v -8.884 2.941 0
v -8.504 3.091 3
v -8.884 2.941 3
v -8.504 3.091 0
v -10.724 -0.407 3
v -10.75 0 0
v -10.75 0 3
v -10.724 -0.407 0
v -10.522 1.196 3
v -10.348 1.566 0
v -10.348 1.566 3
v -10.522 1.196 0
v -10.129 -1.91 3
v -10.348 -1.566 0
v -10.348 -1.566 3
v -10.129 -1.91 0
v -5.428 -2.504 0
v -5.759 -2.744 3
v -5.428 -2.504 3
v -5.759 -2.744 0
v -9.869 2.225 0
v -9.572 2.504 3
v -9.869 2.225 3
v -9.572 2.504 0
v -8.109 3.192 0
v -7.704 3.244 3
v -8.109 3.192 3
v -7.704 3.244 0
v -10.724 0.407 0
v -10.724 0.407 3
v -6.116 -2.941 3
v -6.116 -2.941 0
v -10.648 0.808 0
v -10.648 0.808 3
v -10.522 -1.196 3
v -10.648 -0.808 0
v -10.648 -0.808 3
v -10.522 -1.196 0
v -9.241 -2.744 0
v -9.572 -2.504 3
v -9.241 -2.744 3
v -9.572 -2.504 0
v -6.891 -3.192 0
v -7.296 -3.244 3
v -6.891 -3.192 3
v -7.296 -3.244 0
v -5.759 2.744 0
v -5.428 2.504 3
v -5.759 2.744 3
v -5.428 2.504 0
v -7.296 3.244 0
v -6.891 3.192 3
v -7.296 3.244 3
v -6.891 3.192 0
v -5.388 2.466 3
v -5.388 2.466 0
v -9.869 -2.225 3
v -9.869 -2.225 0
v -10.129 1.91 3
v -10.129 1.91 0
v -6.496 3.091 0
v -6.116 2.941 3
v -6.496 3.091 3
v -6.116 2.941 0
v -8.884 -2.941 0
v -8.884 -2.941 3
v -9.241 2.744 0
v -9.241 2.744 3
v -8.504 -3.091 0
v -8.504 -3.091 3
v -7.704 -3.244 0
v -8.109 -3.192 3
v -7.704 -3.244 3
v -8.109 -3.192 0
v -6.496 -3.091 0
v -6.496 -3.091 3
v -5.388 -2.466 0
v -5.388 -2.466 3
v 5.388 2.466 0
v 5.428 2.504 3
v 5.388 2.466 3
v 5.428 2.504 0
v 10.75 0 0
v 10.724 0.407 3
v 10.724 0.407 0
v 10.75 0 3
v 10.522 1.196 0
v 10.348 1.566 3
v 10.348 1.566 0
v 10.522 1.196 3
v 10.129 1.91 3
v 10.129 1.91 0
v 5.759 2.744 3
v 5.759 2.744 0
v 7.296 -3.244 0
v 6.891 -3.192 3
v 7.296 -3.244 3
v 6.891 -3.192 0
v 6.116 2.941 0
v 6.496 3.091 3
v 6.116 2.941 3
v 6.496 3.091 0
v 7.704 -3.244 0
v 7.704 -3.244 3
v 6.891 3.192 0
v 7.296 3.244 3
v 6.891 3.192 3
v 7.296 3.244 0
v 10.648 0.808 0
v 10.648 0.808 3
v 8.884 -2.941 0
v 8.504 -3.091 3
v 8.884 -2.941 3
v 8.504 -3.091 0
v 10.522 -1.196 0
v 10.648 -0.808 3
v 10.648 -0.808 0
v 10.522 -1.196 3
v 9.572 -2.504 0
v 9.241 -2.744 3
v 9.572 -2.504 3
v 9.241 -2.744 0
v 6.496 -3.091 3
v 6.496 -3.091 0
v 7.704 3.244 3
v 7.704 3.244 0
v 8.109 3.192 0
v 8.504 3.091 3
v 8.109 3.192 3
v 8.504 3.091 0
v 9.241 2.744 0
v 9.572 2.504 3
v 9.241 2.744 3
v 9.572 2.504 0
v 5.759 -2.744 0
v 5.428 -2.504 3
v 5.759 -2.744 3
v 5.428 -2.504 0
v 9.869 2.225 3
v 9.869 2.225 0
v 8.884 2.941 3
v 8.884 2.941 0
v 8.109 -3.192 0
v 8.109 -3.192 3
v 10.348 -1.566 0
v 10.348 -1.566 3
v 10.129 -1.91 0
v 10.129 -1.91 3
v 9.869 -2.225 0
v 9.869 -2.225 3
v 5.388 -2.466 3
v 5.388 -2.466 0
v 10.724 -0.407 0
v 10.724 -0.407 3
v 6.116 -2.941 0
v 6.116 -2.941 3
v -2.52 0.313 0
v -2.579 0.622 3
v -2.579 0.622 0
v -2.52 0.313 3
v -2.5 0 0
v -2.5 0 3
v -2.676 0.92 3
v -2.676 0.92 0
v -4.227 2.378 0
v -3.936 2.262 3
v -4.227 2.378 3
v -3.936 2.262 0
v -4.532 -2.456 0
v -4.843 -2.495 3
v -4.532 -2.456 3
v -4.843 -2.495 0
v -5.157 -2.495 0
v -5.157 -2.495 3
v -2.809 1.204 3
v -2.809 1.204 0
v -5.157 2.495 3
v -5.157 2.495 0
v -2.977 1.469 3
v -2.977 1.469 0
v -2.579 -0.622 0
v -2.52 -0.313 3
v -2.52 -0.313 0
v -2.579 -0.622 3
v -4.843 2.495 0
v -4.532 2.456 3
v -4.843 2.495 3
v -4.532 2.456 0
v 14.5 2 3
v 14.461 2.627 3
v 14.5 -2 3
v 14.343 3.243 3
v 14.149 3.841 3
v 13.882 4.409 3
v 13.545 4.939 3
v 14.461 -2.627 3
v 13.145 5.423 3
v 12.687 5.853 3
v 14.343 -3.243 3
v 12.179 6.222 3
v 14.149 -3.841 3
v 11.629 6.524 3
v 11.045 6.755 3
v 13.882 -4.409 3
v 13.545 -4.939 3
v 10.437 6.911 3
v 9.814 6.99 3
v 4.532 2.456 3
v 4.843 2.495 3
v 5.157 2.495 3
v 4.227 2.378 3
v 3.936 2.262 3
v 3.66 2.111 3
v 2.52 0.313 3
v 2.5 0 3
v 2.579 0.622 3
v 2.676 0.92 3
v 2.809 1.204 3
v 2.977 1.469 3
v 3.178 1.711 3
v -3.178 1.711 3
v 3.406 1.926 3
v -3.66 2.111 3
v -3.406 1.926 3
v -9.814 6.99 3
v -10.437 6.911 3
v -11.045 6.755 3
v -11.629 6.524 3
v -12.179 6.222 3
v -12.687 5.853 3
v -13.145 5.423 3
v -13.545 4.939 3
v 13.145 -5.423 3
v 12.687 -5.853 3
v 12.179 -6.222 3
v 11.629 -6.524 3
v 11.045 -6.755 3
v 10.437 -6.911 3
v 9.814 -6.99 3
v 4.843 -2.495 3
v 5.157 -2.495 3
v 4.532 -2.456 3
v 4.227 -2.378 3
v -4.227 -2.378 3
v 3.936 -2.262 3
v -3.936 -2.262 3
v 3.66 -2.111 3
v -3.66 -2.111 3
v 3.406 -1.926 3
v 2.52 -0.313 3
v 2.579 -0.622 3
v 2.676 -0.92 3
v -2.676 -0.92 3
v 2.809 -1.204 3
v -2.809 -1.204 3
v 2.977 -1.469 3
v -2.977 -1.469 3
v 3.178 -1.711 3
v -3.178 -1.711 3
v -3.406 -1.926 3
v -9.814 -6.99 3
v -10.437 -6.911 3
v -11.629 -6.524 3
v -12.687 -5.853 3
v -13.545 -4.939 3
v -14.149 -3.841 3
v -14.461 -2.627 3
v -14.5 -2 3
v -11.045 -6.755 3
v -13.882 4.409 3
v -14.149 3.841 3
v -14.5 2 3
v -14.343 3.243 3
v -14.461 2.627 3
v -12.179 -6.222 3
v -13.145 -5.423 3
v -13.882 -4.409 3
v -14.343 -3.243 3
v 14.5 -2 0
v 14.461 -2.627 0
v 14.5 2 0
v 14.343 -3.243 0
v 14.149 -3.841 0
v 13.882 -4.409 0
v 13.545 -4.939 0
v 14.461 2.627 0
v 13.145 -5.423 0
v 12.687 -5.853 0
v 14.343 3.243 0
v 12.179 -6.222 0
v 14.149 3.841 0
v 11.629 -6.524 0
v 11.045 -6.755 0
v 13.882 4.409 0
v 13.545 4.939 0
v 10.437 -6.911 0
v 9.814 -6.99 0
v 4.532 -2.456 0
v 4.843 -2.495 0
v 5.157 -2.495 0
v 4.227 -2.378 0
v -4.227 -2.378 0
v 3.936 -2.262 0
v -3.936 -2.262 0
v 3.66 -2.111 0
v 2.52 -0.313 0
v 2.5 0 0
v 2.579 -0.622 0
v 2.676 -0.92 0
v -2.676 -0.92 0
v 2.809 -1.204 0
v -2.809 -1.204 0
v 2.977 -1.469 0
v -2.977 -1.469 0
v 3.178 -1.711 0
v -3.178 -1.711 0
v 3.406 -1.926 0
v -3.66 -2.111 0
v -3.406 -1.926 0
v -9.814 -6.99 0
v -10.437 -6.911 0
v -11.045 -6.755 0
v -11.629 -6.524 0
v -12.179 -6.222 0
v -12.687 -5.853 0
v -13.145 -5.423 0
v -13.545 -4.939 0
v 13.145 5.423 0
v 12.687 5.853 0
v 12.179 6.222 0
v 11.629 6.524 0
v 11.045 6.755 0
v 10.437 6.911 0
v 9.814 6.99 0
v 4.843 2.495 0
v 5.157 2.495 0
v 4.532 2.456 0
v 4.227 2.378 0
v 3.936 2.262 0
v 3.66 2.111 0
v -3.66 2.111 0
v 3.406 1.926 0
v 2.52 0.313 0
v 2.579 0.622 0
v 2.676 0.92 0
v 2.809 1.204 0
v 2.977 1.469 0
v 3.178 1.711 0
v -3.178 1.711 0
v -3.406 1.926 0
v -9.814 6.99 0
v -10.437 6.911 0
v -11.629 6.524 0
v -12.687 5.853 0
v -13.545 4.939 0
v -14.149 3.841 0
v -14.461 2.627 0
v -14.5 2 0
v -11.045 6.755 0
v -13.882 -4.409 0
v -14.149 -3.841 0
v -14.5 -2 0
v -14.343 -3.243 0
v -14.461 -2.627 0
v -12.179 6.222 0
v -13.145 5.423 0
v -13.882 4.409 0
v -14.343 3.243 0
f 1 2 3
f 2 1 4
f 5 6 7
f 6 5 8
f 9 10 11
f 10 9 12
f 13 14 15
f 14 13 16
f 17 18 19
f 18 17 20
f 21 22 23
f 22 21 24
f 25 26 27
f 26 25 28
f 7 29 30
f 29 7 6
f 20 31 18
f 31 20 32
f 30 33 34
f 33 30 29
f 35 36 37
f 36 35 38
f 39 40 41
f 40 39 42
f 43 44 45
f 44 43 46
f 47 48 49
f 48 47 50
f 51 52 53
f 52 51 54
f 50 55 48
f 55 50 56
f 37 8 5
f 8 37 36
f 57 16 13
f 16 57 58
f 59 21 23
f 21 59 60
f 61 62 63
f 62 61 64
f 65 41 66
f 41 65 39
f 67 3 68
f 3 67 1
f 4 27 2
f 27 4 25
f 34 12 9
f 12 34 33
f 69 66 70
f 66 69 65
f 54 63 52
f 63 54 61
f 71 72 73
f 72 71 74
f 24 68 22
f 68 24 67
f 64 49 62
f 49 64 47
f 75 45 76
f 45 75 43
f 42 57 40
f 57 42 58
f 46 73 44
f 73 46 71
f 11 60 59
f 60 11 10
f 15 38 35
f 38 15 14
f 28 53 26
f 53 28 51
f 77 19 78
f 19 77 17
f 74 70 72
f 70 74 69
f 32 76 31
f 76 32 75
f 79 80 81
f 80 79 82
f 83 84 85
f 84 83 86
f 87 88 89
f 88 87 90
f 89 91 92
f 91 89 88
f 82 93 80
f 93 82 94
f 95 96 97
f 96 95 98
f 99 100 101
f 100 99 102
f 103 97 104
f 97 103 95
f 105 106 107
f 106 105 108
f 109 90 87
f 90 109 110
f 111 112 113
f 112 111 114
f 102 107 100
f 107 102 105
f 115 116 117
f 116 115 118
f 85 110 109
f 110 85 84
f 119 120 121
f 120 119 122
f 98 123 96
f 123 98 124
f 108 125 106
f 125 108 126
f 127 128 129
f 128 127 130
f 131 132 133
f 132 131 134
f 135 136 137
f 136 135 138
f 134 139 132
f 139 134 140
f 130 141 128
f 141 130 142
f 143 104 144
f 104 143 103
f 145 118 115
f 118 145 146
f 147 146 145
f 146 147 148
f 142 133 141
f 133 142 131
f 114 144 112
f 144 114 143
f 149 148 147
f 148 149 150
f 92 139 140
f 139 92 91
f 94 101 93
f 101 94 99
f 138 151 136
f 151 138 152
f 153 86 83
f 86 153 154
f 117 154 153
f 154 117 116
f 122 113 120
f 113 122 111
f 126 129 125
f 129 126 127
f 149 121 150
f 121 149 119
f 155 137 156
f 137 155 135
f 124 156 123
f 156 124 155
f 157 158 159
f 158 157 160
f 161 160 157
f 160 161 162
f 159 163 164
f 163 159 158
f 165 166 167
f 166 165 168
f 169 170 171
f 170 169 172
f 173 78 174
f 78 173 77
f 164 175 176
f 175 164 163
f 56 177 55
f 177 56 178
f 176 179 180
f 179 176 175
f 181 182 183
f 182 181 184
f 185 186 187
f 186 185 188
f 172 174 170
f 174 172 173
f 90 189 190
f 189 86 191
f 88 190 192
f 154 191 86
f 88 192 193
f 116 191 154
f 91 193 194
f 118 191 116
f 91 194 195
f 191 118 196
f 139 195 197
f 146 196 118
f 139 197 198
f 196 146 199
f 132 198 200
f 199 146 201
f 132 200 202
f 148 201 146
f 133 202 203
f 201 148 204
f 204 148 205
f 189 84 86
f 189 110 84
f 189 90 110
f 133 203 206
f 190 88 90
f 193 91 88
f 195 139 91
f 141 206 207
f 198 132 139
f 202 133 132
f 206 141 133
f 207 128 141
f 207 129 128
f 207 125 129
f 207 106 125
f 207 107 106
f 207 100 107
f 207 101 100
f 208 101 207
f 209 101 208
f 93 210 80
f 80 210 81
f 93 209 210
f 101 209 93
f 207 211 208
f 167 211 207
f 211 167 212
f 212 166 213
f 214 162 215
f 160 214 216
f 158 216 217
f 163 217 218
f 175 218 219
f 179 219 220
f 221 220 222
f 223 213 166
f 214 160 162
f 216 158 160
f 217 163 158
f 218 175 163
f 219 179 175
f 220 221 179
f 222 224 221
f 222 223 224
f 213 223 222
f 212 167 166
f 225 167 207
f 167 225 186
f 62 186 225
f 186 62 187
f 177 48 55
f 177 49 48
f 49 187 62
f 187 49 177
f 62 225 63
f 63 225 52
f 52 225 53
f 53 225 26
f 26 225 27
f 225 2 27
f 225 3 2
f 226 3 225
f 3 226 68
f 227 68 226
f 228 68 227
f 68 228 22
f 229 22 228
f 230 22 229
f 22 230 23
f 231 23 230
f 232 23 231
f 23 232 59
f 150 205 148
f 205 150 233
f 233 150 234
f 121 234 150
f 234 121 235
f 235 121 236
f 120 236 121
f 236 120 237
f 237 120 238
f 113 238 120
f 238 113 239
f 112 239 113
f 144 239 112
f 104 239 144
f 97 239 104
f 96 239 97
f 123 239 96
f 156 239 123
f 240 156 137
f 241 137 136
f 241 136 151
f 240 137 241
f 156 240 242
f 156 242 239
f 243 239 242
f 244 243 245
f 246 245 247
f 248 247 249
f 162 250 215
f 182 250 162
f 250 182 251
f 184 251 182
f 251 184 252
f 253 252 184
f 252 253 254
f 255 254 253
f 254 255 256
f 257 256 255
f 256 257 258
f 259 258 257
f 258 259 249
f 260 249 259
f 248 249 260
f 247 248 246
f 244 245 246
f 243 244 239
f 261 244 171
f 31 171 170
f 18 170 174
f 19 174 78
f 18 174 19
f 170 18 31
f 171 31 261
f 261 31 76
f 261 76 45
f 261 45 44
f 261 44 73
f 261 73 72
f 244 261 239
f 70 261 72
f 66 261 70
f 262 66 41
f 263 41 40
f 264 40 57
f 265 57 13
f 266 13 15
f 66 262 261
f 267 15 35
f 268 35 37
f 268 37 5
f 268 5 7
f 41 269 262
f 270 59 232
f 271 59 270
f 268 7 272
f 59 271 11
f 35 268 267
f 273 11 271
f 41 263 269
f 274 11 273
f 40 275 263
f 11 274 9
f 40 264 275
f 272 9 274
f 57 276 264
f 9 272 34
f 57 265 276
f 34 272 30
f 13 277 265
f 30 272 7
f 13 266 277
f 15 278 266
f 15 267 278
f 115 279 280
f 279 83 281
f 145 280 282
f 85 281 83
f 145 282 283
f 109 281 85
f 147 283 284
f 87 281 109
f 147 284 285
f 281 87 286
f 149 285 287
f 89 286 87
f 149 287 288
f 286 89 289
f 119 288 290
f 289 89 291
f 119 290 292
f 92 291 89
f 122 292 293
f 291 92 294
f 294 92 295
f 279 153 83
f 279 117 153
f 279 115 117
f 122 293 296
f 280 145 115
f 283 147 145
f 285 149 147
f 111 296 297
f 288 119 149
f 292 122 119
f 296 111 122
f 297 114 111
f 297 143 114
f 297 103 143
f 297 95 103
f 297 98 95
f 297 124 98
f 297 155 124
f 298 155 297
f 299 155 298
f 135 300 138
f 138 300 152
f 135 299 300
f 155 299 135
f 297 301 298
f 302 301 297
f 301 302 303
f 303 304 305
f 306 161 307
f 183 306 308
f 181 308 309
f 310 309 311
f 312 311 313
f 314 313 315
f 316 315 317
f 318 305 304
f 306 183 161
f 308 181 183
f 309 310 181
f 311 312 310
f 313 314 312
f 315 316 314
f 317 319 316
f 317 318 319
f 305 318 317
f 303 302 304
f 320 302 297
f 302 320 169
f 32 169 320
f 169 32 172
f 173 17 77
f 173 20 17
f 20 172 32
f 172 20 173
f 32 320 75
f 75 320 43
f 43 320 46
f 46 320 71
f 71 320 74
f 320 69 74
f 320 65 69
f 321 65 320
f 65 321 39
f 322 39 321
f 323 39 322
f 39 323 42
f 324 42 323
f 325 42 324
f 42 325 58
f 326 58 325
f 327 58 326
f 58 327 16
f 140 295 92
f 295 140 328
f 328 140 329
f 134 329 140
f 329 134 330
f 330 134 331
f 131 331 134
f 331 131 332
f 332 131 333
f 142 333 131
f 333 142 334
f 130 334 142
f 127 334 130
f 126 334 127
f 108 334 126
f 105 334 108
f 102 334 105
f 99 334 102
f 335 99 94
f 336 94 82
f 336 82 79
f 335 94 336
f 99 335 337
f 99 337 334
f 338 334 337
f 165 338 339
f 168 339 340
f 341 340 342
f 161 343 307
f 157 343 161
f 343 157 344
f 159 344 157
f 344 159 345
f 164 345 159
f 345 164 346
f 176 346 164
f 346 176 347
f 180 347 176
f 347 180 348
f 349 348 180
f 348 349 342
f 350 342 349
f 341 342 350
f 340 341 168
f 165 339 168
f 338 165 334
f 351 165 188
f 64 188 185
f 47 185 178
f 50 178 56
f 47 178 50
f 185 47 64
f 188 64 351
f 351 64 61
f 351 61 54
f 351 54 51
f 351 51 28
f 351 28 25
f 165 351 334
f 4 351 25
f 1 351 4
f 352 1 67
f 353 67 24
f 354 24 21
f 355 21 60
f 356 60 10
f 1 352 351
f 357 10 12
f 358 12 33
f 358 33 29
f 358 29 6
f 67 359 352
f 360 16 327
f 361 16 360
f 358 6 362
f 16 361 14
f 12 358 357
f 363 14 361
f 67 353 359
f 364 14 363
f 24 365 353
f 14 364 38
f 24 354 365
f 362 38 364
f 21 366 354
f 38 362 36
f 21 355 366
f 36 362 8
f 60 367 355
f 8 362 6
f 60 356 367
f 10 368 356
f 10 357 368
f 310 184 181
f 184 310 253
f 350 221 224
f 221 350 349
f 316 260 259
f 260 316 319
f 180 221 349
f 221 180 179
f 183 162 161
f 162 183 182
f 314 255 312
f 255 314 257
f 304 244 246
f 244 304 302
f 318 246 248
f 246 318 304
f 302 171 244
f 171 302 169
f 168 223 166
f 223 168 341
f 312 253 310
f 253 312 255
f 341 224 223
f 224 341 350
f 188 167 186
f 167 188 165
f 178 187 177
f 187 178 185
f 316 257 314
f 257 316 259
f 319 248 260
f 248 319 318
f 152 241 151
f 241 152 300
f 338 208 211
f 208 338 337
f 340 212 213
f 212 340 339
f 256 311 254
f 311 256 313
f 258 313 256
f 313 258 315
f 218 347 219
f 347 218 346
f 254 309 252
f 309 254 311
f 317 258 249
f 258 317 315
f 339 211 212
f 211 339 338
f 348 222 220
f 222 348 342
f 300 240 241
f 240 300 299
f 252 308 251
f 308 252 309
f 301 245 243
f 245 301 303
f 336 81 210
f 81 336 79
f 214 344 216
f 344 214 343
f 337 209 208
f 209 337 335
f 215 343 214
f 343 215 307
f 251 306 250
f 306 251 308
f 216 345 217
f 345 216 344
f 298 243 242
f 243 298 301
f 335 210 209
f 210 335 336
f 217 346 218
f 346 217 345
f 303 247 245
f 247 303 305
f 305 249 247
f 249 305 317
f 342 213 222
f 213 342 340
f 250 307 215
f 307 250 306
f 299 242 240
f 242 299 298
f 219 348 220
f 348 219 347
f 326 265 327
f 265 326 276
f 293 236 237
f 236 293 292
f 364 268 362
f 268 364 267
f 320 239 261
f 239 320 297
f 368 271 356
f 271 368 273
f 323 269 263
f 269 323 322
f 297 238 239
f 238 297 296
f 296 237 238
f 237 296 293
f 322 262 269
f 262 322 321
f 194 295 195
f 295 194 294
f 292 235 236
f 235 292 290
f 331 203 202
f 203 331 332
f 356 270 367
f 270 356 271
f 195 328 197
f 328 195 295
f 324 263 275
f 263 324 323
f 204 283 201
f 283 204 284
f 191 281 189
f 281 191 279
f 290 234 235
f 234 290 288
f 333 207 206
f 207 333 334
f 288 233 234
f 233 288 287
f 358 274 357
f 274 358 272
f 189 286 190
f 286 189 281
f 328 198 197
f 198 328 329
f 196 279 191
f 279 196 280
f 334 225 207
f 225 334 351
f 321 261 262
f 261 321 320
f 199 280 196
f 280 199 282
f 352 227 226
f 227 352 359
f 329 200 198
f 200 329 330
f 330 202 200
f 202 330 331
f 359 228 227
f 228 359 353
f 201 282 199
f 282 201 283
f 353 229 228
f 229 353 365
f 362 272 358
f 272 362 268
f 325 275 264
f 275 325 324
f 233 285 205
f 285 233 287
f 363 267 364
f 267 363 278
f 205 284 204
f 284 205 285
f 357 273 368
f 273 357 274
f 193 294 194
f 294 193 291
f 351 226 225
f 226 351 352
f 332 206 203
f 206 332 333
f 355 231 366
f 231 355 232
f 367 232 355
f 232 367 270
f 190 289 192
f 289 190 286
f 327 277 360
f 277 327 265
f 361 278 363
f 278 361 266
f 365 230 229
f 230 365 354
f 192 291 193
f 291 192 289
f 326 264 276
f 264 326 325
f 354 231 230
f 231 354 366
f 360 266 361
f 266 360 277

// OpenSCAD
$fn = 50;


difference() {
	union() {
		hull() {
			translate(v = [-9.5000000000, 2.0000000000, 0]) {
				cylinder(h = 3, r = 5);
			}
			translate(v = [9.5000000000, 2.0000000000, 0]) {
				cylinder(h = 3, r = 5);
			}
			translate(v = [-9.5000000000, -2.0000000000, 0]) {
				cylinder(h = 3, r = 5);
			}
			translate(v = [9.5000000000, -2.0000000000, 0]) {
				cylinder(h = 3, r = 5);
			}
		}
	}
	union() {
		#translate(v = [-7.5000000000, 0.0000000000, -100.0000000000]) {
			cylinder(h = 200, r = 3.2500000000);
		}
		#translate(v = [-7.5000000000, 0.0000000000, -100.0000000000]) {
			cylinder(h = 200, r = 3.2500000000);
		}
		#translate(v = [7.5000000000, 0.0000000000, -100.0000000000]) {
			cylinder(h = 200, r = 3.2500000000);
		}
		#translate(v = [7.5000000000, 0.0000000000, -100.0000000000]) {
			cylinder(h = 200, r = 3.2500000000);
		}
		#translate(v = [-5.0000000000, 0, 0]) {
			cylinder(h = 3, r = 2.5000000000);
		}
		#translate(v = [5.0000000000, 0, 0]) {
			cylinder(h = 3, r = 2.5000000000);
		}
	}
}
